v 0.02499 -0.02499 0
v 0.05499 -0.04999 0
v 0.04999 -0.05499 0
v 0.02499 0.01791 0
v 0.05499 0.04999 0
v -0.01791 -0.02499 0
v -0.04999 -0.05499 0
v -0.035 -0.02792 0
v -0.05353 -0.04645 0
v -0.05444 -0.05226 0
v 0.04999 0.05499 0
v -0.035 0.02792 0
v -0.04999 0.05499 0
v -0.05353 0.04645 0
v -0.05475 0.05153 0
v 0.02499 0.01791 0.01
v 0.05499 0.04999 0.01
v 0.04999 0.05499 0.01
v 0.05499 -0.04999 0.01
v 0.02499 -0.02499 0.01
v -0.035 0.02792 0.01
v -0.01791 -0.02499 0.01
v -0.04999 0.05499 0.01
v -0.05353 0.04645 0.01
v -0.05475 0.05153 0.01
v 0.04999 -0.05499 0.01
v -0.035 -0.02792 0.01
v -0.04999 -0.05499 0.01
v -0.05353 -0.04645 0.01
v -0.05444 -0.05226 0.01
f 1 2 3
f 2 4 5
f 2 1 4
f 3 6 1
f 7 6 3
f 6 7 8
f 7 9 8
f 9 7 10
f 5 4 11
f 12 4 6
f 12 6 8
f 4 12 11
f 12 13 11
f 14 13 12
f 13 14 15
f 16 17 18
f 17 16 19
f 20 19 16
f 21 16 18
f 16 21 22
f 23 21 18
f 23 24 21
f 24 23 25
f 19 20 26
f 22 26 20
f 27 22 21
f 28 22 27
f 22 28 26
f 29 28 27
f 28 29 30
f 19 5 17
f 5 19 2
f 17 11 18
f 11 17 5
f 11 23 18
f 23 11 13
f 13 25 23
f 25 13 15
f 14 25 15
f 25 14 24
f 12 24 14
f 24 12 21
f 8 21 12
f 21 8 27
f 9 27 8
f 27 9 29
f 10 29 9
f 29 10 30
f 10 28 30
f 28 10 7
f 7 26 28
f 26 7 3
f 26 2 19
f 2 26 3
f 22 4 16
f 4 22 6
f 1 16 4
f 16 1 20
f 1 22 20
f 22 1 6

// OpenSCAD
module mounting_plate() {
    difference() {
        // Base plate
        linear_extrude(height=0.01)
        offset(r=0.005)
        polygon(points=[
            [-0.05, -0.05], [0.05, -0.05], [0.05, 0.05], [-0.05, 0.05],
            [-0.03, 0.03], [-0.03, -0.03], [0.03, -0.03], [0.03, 0.03]
        ]);

        // Diamond-shaped holes
        for (x = [-0.03, 0.03]) {
            for (y = [-0.03, 0.03]) {
                translate([x, y, 0])
                rotate(45)
                square([0.01, 0.01], center=true);
            }
        }
    }
}

mounting_plate();
